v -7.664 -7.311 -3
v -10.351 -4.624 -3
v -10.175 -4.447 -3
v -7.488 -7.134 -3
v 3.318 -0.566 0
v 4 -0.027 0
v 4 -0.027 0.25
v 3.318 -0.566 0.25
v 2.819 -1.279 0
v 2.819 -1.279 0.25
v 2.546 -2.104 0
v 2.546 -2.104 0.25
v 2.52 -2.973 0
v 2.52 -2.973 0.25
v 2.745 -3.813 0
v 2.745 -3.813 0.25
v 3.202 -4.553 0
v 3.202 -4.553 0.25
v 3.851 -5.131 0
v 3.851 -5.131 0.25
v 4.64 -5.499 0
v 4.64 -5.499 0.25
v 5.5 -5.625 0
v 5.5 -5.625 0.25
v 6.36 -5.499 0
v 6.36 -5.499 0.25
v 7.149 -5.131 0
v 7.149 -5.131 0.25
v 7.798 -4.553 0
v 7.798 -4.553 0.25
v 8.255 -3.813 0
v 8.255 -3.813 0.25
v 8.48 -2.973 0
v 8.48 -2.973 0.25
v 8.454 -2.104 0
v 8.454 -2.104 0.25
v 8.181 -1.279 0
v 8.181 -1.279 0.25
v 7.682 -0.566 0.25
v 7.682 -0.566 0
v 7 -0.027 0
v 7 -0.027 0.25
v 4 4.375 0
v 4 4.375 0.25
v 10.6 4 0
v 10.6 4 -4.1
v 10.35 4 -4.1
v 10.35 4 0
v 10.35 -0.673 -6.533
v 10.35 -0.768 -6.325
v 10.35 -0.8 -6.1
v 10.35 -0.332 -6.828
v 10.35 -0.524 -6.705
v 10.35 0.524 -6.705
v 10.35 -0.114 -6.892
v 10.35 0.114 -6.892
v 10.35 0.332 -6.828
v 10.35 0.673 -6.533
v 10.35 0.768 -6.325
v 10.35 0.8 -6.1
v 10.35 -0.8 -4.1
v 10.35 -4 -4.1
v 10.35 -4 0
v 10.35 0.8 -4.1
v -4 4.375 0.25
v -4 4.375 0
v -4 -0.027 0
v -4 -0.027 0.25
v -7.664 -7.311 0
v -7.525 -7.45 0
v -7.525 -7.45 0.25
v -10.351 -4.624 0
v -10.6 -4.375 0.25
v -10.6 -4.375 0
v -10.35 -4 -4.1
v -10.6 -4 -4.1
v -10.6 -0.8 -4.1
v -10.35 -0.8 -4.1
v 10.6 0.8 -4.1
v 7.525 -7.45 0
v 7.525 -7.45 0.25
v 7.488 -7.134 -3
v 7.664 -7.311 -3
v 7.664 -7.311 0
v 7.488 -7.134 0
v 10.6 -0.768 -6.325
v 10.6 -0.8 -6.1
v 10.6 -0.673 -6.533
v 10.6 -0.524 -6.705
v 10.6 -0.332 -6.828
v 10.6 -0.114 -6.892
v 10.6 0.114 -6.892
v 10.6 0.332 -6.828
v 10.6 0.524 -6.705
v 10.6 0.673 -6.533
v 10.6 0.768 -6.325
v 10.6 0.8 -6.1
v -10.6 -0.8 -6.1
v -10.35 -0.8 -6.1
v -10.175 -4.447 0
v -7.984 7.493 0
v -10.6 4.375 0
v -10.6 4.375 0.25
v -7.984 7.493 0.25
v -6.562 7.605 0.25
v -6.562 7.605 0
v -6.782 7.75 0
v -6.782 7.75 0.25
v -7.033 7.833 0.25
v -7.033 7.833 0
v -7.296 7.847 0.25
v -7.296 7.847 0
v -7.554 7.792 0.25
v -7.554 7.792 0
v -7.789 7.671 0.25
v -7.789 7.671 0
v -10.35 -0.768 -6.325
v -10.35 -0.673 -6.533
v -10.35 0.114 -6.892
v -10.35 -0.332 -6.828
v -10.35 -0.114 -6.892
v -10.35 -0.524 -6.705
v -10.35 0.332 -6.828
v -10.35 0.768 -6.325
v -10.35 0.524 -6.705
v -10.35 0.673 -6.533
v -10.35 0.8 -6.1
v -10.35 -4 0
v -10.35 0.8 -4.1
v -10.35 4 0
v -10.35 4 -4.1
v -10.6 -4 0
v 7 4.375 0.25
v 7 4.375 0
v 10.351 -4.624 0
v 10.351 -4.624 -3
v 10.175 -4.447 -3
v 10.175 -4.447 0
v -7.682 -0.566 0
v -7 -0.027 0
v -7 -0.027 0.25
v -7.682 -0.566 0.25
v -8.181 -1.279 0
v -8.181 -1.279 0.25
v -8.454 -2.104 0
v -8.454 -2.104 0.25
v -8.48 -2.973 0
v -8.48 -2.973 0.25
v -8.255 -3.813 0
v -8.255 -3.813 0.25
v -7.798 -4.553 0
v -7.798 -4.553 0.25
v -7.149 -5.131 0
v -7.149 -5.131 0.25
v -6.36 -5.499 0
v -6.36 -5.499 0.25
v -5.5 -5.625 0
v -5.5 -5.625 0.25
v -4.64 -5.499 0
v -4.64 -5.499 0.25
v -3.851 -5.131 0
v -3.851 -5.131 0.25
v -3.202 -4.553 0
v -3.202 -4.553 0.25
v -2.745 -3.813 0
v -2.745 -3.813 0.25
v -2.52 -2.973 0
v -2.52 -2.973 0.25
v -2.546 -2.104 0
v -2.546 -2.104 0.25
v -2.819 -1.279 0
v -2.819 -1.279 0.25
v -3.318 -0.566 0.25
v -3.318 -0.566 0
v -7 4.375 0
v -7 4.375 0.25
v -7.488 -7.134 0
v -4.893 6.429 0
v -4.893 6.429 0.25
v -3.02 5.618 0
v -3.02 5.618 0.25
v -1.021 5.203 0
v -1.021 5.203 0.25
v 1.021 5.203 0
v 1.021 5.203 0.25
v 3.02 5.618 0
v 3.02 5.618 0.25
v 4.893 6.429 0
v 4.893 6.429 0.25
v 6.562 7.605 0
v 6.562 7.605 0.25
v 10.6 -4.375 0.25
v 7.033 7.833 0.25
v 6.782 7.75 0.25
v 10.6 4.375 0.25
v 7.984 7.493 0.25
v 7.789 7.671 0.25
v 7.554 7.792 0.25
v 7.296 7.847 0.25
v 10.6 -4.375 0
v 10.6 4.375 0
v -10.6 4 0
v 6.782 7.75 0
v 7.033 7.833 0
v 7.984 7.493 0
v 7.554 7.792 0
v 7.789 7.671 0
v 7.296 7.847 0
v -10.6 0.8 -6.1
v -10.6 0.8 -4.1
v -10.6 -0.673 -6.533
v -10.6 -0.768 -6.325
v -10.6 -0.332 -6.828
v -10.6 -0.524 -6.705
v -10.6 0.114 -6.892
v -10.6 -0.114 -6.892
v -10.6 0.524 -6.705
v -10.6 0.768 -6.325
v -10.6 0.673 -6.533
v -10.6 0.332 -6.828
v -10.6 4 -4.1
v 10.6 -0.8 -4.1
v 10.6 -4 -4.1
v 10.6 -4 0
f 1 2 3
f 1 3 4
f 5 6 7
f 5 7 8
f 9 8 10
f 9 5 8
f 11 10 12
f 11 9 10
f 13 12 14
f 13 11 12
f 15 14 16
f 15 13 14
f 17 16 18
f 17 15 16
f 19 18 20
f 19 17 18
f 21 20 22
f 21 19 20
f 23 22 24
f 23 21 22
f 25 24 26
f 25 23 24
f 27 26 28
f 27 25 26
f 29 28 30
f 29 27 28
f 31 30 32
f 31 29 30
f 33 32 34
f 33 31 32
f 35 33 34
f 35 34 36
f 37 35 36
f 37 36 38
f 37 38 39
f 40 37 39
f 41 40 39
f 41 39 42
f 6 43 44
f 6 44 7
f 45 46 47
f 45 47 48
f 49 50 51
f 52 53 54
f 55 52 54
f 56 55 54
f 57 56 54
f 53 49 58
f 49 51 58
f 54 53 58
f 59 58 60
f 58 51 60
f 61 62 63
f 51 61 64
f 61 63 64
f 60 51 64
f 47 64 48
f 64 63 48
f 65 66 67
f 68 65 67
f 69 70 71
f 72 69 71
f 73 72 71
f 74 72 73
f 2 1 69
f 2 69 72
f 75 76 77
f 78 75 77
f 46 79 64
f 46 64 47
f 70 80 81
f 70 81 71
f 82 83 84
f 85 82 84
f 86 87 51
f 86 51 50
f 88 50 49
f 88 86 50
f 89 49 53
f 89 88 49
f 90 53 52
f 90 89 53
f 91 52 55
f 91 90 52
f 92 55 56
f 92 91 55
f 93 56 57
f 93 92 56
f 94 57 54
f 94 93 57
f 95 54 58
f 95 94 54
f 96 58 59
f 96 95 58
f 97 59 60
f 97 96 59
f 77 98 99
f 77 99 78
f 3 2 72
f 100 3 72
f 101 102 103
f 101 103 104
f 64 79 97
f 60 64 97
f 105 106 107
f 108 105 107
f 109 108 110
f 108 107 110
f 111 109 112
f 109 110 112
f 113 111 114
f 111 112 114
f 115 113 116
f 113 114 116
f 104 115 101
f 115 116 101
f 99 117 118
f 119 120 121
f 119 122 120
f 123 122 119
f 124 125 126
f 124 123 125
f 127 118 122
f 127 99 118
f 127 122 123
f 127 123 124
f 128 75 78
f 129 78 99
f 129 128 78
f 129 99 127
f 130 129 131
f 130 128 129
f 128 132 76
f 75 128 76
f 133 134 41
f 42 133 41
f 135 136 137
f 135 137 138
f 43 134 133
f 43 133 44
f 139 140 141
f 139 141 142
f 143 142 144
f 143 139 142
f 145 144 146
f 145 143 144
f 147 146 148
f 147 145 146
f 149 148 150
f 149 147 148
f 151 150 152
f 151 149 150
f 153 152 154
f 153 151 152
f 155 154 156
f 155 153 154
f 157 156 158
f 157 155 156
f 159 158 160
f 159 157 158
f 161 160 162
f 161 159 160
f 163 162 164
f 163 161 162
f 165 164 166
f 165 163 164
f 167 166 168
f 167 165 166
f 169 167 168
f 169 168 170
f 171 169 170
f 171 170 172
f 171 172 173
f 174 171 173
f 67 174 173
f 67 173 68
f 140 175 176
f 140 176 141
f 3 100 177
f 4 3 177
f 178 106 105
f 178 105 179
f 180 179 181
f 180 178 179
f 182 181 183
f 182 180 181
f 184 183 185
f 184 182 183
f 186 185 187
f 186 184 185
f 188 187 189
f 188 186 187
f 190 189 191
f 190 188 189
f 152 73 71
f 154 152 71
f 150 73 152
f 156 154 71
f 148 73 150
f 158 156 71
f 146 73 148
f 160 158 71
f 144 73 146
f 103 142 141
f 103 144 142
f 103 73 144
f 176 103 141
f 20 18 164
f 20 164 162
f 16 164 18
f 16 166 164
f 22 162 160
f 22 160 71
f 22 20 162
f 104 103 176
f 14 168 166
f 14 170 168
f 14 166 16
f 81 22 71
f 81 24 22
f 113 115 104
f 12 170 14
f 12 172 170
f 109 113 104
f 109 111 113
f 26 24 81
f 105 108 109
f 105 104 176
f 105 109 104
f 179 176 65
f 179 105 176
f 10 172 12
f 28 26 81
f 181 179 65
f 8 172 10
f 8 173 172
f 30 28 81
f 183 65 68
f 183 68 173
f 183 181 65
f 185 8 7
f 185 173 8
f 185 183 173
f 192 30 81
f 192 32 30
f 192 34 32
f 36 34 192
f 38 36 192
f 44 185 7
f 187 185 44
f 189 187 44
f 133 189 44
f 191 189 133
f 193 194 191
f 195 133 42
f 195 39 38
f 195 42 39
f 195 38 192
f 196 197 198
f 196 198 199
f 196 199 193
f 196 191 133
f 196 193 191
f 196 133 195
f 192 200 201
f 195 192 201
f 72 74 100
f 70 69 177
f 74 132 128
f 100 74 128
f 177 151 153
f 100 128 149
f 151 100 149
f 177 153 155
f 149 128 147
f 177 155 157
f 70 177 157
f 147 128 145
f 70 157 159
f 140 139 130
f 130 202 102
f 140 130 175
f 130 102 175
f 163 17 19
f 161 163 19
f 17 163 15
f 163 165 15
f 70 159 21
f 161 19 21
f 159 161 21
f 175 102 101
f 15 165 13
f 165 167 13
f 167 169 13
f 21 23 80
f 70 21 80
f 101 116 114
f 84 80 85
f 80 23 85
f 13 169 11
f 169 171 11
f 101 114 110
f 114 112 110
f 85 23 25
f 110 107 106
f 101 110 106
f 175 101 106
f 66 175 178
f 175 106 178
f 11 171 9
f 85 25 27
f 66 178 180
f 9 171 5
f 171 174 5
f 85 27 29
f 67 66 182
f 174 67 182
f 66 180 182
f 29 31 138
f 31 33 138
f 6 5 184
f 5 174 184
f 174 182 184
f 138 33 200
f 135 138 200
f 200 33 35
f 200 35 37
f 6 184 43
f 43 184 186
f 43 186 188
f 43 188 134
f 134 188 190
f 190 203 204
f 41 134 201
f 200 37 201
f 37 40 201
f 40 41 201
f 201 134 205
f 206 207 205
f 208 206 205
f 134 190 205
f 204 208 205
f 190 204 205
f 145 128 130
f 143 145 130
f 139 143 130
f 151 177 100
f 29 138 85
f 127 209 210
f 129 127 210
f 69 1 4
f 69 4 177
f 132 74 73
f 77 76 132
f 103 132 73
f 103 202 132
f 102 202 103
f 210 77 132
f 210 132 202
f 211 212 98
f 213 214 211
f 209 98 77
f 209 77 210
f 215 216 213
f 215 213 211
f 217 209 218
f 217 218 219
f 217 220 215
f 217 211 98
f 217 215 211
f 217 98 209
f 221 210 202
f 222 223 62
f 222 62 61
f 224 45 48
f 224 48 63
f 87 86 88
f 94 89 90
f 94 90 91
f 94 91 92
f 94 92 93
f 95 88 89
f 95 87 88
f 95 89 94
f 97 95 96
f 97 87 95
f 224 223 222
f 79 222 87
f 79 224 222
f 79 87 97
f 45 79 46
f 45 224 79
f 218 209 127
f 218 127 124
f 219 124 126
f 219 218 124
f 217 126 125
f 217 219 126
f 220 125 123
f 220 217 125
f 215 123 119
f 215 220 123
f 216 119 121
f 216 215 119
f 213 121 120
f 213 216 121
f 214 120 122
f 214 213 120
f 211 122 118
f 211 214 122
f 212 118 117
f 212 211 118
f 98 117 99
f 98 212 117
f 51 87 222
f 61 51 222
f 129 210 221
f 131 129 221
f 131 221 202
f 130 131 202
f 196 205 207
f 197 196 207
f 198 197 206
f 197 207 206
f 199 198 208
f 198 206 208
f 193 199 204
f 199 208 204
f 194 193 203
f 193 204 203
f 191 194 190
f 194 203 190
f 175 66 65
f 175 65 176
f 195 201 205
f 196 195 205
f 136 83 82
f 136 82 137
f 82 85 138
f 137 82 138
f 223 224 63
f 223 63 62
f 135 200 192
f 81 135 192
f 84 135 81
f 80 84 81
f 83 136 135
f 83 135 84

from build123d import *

# Parameters (mm, degrees)
PAD_DEPTH    = 0.25
SKETCH001_W  = 3.8
SKETCH001_H  = 3
PAD001_DEPTH = 0.25
SKETCH002_W  = 3.8
SKETCH002_H  = 3
PAD002_DEPTH = 0.25
PAD005_DEPTH = 0.25
PAD006_DEPTH = 0.25


with BuildPart() as pad005:
    # Sketch → Pad (new body)
    with BuildSketch(Plane.XY):
        with BuildLine():
            Line((10.6, -4.375), (10.6, 4.375))
            Line((10.6, 4.375), (7.983866, 7.492788))
            ThreePointArc((7.983866, 7.492788), (7.29621, 7.846923), (6.561656, 7.604617))
            ThreePointArc((-6.561656, 7.604617), (0, 5.150787), (6.561656, 7.604617))
            ThreePointArc((-6.561656, 7.604617), (-7.296205, 7.846923), (-7.983859, 7.492796))
            Line((-10.6, 4.375), (-7.983859, 7.492796))
            Line((-10.6, -4.375), (-10.6, 4.375))
            Line((-7.525, -7.45), (-10.6, -4.375))
            Line((7.525, -7.45), (-7.525, -7.45))
            Line((10.6, -4.375), (7.525, -7.45))
        make_face()
        with BuildLine():
            Line((4, 4.375), (4, -0.026924))
            ThreePointArc((4, -0.026924), (5.5, -5.625), (7, -0.026924))
            Line((7, 4.375), (7, -0.026924))
            Line((7, 4.375), (4, 4.375))
        make_face(mode=Mode.SUBTRACT)
        with BuildLine():
            Line((-7, 4.375), (-7, -0.026924))
            ThreePointArc((-7, -0.026924), (-5.5, -5.625), (-4, -0.026924))
            Line((-4, 4.375), (-4, -0.026924))
            Line((-4, 4.375), (-7, 4.375))
        make_face(mode=Mode.SUBTRACT)
    extrude(amount=PAD_DEPTH)

    # Sketch001 → Pad001 (new body)
    with BuildSketch(Plane(origin=(7.4875, -7.4875, 0), x_dir=(0.707107, 0.707107, 0), z_dir=(0.707107, -0.707107, 0))):
        with Locations((2.15, -1.5)):
            Rectangle(SKETCH001_W, SKETCH001_H)
    extrude(amount=-PAD001_DEPTH)

    # Sketch002 → Pad002 (new body)
    with BuildSketch(Plane(origin=(-7.4875, -7.4875, 0), x_dir=(0.707107, -0.707107, 0), z_dir=(-0.707107, -0.707107, 0))):
        with Locations((-2.15, -1.5)):
            Rectangle(SKETCH002_W, SKETCH002_H)
    extrude(amount=-PAD002_DEPTH)

    # Sketch003 → Pad005 (new body)
    with BuildSketch(Plane(origin=(-10.6, 0, 0), x_dir=(0, -1, 0), z_dir=(-1, 0, 0))):
        with BuildLine():
            Line((-4, 0), (4, 0))
            Line((4, 0), (4, -4.1))
            Line((4, -4.1), (0.8, -4.1))
            Line((0.8, -6.1), (0.8, -4.1))
            ThreePointArc((-0.8, -6.1), (0, -6.9), (0.8, -6.1))
            Line((-0.8, -6.1), (-0.8, -4.1))
            Line((-0.8, -4.1), (-4, -4.1))
            Line((-4, -4.1), (-4, 0))
        make_face()
    extrude(amount=-PAD005_DEPTH)


with BuildPart() as pad006:
    # Sketch004 → Pad006 (new body)
    with BuildSketch(Plane.YZ.offset(10.6)):
        with BuildLine():
            Line((4, 0), (-4, 0))
            Line((-4, 0), (-4, -4.1))
            Line((-4, -4.1), (-0.8, -4.1))
            Line((-0.8, -6.1), (-0.8, -4.1))
            ThreePointArc((-0.8, -6.1), (0, -6.9), (0.8, -6.1))
            Line((0.8, -4.1), (0.8, -6.1))
            Line((0.8, -4.1), (4, -4.1))
            Line((4, -4.1), (4, 0))
        make_face()
    extrude(amount=-PAD006_DEPTH)


solid = Compound([pad005.part, pad006.part])
